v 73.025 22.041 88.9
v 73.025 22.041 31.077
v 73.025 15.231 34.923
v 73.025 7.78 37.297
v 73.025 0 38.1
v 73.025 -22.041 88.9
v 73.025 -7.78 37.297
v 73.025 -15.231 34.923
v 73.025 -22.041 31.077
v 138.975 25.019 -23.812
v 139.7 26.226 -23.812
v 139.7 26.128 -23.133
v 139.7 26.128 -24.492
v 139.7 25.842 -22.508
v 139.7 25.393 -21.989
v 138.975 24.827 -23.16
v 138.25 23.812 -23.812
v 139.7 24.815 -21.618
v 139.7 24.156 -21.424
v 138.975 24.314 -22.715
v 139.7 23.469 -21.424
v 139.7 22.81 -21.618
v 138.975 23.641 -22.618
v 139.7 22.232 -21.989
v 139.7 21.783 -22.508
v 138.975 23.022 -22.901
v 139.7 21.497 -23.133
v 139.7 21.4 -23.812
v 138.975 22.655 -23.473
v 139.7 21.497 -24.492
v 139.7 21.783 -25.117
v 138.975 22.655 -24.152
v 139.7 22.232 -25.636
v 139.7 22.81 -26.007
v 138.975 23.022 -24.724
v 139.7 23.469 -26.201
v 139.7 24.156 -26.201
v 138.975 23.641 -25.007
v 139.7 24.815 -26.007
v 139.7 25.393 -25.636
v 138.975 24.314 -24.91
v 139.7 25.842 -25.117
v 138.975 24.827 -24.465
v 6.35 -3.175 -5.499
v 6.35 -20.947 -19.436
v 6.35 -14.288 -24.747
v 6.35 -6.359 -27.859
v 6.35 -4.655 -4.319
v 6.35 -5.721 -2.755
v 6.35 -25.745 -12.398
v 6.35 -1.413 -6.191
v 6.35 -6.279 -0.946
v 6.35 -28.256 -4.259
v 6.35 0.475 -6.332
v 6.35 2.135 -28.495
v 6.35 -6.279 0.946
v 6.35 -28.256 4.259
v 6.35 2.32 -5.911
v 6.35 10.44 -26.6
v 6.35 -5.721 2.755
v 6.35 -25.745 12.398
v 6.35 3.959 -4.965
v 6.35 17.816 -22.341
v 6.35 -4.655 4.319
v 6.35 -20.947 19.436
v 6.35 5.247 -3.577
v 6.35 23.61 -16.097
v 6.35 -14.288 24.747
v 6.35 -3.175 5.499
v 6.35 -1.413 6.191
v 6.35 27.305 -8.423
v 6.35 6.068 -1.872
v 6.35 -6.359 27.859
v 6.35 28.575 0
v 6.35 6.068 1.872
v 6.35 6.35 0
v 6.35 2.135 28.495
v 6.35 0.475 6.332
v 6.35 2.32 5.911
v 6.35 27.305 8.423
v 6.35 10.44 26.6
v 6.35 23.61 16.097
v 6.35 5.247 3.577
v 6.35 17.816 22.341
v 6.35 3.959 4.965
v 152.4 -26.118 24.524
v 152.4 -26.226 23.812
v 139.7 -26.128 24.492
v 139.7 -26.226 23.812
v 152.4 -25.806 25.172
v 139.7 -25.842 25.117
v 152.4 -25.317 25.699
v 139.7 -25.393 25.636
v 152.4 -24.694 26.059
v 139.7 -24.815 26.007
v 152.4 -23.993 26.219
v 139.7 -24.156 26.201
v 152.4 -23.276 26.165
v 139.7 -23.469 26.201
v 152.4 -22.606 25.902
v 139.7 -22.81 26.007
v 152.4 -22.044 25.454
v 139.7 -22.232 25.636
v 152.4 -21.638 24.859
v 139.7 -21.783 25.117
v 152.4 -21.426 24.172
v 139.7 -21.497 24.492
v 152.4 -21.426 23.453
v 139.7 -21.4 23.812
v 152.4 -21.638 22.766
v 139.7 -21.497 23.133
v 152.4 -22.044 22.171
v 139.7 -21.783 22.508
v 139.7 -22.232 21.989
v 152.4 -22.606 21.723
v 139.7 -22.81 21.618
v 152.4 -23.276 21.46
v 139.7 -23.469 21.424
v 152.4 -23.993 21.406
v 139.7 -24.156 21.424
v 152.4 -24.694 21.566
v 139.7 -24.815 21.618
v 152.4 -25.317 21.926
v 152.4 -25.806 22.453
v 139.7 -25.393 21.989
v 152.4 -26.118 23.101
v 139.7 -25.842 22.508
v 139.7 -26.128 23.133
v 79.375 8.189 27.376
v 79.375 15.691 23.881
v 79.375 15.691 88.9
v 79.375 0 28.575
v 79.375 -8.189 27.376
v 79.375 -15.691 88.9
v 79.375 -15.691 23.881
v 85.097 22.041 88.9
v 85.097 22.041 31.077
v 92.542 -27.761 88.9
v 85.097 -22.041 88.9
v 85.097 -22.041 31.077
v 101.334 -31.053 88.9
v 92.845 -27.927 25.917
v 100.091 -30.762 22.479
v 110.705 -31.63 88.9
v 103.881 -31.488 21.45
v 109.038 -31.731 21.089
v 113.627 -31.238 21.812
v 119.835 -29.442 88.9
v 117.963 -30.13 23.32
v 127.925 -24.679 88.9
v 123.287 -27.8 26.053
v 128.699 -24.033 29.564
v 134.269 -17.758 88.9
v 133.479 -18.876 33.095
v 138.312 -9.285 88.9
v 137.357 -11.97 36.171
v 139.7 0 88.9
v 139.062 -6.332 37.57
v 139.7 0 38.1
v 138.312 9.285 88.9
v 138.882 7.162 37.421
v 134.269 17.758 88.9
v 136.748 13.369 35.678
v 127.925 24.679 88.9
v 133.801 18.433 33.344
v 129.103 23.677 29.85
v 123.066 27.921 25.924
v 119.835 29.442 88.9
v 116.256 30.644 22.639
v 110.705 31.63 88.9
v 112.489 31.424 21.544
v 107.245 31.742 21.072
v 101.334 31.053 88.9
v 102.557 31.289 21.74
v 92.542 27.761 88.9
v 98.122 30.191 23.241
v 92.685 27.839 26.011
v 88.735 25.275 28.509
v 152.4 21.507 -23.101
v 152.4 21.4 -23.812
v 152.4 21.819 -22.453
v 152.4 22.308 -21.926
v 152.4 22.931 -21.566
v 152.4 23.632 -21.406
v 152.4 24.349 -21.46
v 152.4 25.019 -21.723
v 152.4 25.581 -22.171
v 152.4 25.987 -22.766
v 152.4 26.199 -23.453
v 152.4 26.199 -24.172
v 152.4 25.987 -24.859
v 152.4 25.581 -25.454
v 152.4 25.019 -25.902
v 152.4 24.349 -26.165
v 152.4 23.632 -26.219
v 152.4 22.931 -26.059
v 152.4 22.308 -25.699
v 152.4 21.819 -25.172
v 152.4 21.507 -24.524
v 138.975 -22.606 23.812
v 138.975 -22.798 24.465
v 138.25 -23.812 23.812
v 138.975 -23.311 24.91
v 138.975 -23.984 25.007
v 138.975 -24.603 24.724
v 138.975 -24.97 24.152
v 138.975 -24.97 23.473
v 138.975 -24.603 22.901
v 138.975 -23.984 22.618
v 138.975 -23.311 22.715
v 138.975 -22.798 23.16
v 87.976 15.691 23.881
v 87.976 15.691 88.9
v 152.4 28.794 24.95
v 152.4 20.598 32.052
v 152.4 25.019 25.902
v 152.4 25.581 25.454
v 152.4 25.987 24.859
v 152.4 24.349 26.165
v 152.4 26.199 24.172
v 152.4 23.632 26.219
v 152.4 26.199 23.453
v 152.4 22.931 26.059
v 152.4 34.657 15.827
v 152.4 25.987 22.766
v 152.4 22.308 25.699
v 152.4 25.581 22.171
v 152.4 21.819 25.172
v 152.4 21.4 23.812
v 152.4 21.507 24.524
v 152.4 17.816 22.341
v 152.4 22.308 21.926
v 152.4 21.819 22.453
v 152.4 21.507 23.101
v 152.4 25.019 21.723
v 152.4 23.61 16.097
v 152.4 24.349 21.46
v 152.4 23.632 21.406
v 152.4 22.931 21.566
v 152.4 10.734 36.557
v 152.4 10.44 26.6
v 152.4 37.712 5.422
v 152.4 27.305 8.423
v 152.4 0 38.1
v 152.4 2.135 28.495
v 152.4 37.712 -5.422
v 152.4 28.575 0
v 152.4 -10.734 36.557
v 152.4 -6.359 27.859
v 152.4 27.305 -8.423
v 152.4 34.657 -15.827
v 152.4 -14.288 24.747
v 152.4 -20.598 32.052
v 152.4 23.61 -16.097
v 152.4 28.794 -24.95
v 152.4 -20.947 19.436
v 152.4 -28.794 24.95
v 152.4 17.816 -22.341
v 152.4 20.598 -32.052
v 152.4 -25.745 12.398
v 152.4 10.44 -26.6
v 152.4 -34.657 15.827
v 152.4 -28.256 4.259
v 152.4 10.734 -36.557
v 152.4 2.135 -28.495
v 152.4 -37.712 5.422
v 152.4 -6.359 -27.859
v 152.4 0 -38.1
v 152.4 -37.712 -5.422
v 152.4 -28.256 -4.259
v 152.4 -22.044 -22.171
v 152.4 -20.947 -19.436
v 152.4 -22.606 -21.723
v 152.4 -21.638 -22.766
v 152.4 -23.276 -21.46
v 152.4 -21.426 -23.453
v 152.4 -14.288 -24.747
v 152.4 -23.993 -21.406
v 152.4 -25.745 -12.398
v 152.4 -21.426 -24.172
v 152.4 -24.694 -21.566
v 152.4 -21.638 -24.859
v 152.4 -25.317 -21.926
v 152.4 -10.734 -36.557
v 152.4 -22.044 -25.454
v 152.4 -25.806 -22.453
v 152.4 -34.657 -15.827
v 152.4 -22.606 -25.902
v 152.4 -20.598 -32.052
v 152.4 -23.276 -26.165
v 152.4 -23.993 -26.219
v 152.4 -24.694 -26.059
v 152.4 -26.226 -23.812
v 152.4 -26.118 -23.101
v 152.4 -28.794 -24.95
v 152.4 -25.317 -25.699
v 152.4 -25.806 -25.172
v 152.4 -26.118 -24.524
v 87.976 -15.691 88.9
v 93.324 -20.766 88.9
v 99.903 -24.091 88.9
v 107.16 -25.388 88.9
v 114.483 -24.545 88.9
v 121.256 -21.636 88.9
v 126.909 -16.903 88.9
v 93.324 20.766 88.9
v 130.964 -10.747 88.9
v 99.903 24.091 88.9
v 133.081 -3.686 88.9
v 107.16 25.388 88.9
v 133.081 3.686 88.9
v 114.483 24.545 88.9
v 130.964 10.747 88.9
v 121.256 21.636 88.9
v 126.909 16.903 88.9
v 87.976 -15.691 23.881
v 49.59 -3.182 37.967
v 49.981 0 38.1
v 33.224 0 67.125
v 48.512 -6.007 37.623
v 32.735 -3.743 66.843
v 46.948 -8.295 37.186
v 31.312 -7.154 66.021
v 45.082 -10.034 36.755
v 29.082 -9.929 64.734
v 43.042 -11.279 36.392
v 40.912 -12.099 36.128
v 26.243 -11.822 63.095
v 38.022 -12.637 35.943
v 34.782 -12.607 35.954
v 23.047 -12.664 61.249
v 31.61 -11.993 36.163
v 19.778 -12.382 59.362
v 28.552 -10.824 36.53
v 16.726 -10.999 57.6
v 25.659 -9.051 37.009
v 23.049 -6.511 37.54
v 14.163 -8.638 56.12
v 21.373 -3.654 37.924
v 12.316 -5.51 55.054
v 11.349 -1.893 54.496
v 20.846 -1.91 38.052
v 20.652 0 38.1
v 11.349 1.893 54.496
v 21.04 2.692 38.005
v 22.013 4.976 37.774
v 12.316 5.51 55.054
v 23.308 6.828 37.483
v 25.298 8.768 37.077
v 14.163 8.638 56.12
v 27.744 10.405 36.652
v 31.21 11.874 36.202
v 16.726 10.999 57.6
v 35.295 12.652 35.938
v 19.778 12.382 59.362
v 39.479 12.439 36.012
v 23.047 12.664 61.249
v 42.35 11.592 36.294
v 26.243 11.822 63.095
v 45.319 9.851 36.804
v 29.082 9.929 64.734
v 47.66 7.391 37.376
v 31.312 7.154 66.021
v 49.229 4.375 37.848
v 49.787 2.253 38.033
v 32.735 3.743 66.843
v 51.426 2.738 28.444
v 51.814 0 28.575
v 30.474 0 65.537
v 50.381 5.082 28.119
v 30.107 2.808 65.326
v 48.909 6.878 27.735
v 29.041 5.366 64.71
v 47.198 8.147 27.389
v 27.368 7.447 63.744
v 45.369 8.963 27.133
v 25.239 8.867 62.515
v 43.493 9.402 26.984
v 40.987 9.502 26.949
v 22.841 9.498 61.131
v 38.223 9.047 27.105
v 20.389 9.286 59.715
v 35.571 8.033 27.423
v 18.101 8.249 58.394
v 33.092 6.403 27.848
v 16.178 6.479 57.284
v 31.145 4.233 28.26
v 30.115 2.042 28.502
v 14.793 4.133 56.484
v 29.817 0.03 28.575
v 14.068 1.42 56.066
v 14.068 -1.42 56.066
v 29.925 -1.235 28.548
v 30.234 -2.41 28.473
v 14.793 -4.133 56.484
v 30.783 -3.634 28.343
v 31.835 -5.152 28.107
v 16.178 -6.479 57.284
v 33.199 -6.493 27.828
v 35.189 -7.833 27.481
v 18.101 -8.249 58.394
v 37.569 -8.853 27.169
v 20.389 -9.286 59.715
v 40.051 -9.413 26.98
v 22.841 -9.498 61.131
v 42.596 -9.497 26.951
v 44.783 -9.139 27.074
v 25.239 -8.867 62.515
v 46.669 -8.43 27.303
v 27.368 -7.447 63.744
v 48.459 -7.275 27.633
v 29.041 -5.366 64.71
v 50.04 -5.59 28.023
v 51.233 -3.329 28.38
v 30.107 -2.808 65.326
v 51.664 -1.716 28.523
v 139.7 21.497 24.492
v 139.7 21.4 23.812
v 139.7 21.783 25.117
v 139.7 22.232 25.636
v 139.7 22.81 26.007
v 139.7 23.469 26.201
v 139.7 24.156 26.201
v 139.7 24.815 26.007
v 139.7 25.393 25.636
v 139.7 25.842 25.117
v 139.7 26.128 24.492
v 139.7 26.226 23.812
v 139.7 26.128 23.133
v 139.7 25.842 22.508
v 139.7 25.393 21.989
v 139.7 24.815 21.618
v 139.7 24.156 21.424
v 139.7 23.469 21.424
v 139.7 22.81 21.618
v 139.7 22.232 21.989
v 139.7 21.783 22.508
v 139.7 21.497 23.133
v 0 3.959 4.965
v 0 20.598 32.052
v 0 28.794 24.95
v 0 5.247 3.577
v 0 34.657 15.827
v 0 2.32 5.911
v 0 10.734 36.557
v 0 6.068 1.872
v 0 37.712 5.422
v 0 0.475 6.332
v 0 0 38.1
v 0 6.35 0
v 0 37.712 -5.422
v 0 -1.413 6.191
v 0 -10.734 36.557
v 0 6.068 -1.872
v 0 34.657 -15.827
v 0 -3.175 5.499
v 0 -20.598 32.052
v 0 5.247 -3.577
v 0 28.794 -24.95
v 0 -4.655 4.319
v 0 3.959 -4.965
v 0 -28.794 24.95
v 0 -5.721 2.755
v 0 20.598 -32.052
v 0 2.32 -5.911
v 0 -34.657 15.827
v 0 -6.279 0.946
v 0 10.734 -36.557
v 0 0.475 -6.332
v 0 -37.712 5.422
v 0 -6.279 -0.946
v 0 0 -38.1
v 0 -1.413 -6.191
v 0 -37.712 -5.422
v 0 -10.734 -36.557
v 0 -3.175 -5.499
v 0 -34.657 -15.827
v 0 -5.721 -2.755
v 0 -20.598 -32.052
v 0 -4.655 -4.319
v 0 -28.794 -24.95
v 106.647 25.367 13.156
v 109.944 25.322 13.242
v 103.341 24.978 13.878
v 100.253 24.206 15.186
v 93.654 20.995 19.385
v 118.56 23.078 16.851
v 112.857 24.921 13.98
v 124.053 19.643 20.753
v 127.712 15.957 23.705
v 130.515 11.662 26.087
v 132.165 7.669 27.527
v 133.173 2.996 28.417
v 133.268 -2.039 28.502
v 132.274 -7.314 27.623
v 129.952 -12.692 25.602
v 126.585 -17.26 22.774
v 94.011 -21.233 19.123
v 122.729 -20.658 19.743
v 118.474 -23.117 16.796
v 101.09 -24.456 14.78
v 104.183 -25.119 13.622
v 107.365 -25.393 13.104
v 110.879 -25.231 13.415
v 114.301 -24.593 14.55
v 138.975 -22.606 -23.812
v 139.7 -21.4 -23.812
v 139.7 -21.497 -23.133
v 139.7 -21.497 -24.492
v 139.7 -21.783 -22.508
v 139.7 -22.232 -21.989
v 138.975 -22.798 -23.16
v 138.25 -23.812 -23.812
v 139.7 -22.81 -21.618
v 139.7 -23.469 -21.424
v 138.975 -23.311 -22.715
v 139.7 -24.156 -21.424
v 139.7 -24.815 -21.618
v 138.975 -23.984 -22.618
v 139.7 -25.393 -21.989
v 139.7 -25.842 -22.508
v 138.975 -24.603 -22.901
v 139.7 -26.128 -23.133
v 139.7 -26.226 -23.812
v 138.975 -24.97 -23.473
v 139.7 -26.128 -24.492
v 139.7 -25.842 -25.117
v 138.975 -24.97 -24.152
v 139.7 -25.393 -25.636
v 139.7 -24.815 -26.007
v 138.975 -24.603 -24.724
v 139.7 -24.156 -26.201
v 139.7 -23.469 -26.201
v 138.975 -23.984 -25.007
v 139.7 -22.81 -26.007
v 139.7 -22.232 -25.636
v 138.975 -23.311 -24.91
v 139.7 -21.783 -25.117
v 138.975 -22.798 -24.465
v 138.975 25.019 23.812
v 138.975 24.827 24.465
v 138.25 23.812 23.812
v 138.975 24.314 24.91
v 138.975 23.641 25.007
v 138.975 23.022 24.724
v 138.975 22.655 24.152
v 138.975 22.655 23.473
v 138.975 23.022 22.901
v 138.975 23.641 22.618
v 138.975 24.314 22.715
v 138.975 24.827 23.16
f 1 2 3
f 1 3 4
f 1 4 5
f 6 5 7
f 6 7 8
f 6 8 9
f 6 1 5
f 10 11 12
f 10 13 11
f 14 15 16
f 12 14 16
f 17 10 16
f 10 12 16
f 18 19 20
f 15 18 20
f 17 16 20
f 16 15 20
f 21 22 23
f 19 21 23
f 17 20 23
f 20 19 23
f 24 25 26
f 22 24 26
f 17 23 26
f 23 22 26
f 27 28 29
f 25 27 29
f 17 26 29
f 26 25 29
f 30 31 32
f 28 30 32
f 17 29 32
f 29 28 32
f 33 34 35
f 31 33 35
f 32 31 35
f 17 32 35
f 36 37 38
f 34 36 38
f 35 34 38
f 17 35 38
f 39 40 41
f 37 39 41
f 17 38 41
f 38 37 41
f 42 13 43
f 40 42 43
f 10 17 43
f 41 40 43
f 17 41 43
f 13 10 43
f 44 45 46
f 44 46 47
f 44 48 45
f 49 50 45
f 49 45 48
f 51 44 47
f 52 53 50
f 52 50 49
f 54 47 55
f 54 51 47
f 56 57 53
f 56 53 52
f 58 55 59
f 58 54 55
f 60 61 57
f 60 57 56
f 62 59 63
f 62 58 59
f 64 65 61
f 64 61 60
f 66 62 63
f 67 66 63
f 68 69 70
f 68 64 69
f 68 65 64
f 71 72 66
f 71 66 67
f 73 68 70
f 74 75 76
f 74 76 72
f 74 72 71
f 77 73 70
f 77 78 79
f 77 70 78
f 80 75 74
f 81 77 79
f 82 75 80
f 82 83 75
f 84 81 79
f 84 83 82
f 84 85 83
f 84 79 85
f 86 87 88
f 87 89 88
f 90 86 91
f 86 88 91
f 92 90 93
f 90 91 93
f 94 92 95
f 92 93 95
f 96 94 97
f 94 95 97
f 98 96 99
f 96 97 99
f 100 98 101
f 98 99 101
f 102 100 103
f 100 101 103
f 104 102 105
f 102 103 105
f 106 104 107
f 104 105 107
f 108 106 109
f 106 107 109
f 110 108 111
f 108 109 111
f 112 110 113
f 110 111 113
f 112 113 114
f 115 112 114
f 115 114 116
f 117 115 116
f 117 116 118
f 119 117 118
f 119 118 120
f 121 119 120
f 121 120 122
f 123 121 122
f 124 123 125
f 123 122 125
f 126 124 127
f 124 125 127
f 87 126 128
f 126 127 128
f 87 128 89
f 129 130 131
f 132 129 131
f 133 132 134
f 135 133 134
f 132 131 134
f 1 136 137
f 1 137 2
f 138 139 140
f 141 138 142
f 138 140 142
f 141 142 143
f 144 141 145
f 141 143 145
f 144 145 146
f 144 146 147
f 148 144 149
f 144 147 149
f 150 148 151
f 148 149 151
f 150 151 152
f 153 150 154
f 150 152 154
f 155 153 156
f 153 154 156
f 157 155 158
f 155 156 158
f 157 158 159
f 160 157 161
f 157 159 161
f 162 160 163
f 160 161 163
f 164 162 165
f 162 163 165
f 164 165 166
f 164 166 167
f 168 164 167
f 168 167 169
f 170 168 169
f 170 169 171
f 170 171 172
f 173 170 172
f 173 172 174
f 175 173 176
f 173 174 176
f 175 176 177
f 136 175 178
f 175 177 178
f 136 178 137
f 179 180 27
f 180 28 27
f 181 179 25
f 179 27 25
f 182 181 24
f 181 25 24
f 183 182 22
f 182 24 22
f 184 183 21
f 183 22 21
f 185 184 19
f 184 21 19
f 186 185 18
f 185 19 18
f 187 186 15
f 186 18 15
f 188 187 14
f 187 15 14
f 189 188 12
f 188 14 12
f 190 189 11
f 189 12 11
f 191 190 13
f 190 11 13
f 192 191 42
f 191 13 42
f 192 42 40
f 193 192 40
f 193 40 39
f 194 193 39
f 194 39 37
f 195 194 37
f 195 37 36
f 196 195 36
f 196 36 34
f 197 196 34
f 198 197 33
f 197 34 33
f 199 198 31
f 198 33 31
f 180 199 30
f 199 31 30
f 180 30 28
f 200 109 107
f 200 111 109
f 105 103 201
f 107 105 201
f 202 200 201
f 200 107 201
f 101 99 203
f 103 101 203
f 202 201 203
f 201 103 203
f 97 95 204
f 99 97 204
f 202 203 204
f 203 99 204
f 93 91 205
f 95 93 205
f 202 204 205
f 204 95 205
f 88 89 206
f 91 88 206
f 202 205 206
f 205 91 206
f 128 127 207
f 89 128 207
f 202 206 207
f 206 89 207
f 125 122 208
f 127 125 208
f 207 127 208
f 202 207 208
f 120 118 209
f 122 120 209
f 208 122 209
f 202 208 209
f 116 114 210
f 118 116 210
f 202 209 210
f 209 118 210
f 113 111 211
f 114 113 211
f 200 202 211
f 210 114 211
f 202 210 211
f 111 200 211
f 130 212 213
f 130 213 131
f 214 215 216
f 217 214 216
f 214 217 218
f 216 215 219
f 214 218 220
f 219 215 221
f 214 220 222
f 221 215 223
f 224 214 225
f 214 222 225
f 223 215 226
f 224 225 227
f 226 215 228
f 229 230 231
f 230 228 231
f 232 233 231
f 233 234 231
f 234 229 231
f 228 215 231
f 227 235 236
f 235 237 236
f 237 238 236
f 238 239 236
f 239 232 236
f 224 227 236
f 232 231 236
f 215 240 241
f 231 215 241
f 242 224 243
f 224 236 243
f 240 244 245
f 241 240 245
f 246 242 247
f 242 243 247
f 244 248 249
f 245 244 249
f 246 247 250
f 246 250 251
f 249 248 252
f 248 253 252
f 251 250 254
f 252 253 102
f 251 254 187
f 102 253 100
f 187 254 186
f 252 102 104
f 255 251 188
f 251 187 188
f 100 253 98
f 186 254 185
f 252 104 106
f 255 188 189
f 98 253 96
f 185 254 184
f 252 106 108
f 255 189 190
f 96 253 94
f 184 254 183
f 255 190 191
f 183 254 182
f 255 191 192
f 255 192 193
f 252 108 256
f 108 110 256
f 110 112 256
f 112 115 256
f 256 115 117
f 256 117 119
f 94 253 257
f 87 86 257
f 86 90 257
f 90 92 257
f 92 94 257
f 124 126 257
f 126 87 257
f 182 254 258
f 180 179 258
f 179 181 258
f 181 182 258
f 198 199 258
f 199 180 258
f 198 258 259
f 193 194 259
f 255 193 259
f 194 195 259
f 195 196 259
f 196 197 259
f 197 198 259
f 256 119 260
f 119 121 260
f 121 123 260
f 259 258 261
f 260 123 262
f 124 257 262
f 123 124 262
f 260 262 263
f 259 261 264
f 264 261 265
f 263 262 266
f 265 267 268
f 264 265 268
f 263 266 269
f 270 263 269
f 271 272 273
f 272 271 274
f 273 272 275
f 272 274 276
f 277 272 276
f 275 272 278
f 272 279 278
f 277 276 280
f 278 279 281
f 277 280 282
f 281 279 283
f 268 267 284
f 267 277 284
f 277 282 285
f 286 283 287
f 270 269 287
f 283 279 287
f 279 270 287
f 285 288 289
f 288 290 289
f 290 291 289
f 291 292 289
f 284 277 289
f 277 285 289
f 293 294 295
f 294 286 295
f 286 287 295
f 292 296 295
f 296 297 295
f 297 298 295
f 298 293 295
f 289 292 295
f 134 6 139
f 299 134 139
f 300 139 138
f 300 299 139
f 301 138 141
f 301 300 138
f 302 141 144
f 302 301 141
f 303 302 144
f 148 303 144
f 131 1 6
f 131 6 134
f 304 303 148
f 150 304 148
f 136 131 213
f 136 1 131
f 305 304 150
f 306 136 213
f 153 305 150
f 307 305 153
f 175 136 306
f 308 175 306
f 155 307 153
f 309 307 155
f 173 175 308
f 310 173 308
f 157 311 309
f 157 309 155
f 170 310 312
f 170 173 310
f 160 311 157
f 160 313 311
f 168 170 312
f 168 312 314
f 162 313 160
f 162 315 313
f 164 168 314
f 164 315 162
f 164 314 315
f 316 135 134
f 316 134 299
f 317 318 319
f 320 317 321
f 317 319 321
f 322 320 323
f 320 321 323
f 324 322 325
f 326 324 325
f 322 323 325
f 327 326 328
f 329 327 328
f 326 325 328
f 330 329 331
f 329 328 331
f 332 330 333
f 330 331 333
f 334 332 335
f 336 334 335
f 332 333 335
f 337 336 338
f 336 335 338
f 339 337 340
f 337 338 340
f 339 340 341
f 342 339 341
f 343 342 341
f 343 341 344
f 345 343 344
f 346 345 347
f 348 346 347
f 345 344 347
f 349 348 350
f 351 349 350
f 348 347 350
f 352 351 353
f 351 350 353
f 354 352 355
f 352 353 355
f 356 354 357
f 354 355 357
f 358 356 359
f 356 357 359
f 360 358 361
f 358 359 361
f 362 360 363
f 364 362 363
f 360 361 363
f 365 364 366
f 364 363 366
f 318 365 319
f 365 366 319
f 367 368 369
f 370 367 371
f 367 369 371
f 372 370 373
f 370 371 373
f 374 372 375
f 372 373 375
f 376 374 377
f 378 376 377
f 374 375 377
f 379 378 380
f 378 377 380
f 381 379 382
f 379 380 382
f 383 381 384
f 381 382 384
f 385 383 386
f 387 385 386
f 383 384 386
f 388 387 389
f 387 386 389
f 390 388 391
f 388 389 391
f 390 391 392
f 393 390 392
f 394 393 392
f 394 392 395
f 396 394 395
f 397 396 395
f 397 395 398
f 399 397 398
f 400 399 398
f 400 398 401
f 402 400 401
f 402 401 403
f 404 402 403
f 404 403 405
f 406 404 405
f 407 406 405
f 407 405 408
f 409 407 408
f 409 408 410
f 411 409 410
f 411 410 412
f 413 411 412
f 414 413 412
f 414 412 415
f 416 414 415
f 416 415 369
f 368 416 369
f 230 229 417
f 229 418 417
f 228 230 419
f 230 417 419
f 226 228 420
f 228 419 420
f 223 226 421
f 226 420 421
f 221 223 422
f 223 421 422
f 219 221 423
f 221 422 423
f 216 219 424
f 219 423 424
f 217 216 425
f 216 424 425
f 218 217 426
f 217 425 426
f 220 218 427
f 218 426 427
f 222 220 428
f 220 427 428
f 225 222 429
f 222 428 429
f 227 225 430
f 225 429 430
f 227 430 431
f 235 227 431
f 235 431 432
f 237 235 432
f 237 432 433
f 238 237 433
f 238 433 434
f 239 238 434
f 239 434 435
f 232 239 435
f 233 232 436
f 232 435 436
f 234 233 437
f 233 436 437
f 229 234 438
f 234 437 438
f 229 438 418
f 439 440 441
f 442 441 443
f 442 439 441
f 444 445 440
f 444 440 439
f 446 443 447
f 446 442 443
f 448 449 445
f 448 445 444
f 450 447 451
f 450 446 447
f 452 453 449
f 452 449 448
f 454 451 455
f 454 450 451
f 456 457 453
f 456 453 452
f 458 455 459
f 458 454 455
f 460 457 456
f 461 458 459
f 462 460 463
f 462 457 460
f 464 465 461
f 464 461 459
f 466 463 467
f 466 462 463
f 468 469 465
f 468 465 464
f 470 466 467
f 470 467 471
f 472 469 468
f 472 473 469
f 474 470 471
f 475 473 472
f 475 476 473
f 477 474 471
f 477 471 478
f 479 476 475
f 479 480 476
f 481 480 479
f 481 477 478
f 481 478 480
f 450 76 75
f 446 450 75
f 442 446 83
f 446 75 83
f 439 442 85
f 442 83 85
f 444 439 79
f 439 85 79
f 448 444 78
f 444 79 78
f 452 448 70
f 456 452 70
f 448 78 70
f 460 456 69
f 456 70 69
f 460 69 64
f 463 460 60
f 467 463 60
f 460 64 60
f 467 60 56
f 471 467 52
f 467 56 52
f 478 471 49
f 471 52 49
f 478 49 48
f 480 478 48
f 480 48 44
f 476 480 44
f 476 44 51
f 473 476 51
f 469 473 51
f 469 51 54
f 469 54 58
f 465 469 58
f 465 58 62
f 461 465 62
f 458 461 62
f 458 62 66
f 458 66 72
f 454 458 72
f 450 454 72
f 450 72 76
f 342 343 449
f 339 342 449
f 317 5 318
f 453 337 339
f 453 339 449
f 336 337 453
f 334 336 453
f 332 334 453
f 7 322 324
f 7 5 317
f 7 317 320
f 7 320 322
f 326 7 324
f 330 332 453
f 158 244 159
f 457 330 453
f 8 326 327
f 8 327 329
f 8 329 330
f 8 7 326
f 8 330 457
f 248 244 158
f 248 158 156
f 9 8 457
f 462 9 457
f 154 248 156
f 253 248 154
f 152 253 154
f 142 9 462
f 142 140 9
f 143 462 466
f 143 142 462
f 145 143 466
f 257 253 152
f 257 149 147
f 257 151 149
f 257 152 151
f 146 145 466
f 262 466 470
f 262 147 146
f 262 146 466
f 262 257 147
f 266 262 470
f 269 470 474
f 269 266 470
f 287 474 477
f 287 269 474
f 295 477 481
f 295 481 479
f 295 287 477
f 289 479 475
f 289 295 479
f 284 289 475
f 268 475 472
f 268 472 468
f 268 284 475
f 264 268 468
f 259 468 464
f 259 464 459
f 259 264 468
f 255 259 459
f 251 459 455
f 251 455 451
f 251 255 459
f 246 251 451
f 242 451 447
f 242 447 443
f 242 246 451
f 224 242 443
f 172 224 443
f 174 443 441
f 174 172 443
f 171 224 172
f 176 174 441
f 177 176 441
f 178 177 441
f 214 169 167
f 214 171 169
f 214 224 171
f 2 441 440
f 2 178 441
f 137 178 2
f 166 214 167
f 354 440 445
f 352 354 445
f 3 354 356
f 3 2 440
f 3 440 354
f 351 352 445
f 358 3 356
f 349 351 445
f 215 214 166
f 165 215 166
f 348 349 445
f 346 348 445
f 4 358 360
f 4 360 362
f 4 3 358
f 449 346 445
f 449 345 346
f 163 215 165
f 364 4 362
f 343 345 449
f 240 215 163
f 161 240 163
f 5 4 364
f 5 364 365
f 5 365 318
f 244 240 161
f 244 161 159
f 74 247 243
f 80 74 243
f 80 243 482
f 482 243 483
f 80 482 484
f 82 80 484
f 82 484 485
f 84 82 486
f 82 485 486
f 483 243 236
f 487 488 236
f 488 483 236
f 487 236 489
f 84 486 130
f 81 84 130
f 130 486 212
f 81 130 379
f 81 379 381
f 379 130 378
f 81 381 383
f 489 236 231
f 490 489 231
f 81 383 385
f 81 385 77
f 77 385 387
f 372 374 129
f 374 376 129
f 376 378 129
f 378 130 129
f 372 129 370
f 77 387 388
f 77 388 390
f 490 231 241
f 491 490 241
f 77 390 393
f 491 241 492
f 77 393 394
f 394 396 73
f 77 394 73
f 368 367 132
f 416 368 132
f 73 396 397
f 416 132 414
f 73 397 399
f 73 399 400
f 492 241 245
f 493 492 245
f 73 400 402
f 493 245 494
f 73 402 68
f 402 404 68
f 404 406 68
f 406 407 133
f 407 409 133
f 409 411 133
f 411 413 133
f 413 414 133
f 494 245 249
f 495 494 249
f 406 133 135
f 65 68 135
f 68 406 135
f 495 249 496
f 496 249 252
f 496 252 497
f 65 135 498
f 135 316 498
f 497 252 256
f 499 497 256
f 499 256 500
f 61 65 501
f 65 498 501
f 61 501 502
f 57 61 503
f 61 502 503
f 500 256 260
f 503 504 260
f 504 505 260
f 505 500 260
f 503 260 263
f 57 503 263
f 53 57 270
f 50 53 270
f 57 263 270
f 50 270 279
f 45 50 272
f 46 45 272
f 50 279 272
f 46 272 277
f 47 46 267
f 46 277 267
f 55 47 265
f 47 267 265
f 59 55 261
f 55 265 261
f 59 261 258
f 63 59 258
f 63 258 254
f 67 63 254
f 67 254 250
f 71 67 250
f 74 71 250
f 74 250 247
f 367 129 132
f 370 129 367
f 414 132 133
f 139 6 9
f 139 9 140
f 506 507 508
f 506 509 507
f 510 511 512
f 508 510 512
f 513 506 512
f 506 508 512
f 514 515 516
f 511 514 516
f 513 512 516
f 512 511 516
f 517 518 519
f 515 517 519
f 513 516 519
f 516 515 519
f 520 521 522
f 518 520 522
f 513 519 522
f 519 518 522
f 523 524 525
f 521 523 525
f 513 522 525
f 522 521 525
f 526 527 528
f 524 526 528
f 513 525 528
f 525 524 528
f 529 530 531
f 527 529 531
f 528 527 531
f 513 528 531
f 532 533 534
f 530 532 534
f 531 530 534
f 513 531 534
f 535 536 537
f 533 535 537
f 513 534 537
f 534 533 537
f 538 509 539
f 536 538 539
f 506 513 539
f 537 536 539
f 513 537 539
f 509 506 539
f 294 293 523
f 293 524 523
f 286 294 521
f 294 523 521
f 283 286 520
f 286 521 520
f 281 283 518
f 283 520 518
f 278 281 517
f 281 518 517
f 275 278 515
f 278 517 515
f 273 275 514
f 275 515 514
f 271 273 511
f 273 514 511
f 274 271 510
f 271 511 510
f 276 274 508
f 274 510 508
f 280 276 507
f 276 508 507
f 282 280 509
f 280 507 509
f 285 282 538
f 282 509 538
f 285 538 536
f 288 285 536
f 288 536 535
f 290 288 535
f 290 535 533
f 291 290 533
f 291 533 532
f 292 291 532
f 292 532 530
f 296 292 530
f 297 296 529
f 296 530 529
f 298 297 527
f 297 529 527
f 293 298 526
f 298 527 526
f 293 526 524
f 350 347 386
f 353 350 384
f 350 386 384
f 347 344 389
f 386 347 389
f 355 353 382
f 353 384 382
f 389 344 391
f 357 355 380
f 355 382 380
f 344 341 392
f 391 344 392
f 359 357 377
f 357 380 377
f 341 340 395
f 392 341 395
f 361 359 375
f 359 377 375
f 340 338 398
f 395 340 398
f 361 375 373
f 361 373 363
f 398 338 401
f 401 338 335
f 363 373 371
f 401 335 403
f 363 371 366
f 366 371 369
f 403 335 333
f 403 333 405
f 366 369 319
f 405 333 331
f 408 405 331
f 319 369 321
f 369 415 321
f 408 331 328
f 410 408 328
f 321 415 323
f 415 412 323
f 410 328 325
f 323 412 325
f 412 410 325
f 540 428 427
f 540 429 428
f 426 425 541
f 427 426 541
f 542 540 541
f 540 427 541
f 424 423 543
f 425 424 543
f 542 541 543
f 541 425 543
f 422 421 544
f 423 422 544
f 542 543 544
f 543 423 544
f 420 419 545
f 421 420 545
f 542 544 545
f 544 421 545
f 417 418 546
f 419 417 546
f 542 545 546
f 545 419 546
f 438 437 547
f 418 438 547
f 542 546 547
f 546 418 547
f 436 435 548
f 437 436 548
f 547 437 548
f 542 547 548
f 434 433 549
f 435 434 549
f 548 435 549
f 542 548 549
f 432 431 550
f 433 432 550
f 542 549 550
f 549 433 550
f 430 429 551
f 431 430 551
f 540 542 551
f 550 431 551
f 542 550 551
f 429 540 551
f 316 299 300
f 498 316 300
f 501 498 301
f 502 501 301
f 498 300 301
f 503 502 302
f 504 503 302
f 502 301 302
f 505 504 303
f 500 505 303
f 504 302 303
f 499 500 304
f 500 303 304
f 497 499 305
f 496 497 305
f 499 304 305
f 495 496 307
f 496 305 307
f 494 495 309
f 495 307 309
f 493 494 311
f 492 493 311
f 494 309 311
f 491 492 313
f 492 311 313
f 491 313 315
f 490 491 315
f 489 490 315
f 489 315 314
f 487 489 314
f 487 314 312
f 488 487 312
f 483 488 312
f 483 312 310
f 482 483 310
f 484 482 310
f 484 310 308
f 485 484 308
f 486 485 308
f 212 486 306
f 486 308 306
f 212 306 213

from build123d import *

# Parameters (mm, degrees)
F0_W      = 152.4
F0_H      = 38.1
F3_R      = 31.75
F4_DEPTH  = 25.4
F5_DEPTH  = 50.8
F7_DEPTH  = 76.2
F11_DEPTH = 76.2
F12_R     = 28.575
F13_DEPTH = 146.05
F14_R     = 9.525
F15_DEPTH = 50.8
F17_D     = 4.826
F17_DEPTH = 12.7
F17_TIP   = 1.4498766737
F19_D     = 12.7
F19_DEPTH = 12.7
F19_TIP   = 3.8154649308


# Not quite as in the source:
# - a feature names something its author has since deleted; it is built from what else it names


with BuildPart() as f1:
    # F0 (on Front) → F1 (revolve)
    with BuildSketch(Plane.XZ):
        with Locations((76.2, 19.05)):
            Rectangle(F0_W, F0_H)
    revolve(axis=Axis((76.2, 0, 0), (1, 0, 0)))

    # F3 (on offset) → F4 (join)
    with BuildSketch(Plane.XY.offset(38.1)):
        with Locations((107.95, 0)):
            Circle(F3_R)
    extrude(amount=-F4_DEPTH)

    # F5 (add): a face of the model
    f5_faces = [f1.faces().sort_by_distance(p)[0] for p in [
        (107.95, 0, 38.1),
    ]]
    extrude(f5_faces, amount=F5_DEPTH)

    # F6 (on face) → F7 (join)
    with BuildSketch(Plane.XY.offset(88.9)):
        with BuildLine():
            Line((73.025, -22.0412760045), (85.097327244, -22.0412760045))
            ThreePointArc((85.097327244, -22.0412760045), (76.2, 0), (85.097327244, 22.0412760045))
            Line((85.097327244, 22.0412760045), (73.025, 22.0412760045))
            Line((73.025, 22.0412760045), (73.025, -22.0412760045))
        make_face()
    extrude(amount=-F7_DEPTH)

    # F8 (on Front) → F9 (revolve)
    with BuildSketch(Plane.XZ):
        Polygon((33.2235226281, 67.1248349075), (22.225, 60.7748349075), (38.982496247, 31.75), (49.9810188751, 38.1), align=None)
    revolve(axis=Axis((30.6037481235, 0, 46.2624174538), (0.5, 0, -0.8660254038)))

    # F10 (on face) → F11 (cut)
    with BuildSketch(Plane.XY.offset(88.9)):
        with BuildLine():
            Line((79.3750002146, -15.69127579), (87.9764211223, -15.69127579))
            ThreePointArc((87.9764211223, -15.69127579), (133.3499997854, 0), (87.9764211223, 15.69127579))
            Line((87.9764211223, 15.69127579), (79.3750002146, 15.69127579))
            Line((79.3750002146, 15.69127579), (79.3750002146, -15.69127579))
        make_face()
    extrude(amount=-F11_DEPTH, mode=Mode.SUBTRACT)

    # F12 (on face) → F13 (cut)
    with BuildSketch(Plane.YZ.offset(152.4)):
        Circle(F12_R)
    extrude(amount=-F13_DEPTH, mode=Mode.SUBTRACT)

    # F14 (on face) → F15 (cut)
    with BuildSketch(Plane(origin=(-20.7600254704, 0, 35.9574188811), x_dir=(0.8660254038, 0, 0.5), z_dir=(-0.5, 0, 0.8660254038))):
        with Locations((49.6348320529, 0)):
            Circle(F14_R)
    extrude(amount=-F15_DEPTH, mode=Mode.SUBTRACT)

    # F17
    with Locations(Plane.YZ.offset(152.4)):
        with Locations((-23.8125, 23.8125), (23.8125, 23.8125), (23.8125, -23.8125), (-23.8125, -23.8125)):
            Hole(F17_D / 2, depth=F17_DEPTH)
            with Locations((0, 0, -(F17_DEPTH + F17_TIP / 2))):  # 118° drill point
                Cone(0, F17_D / 2, F17_TIP, mode=Mode.SUBTRACT)

    # F19
    with Locations(Plane(origin=(0, 0, 0), x_dir=(0, -1, 0), z_dir=(-1, 0, 0))):
        with Locations((0, 0)):
            Hole(F19_D / 2, depth=F19_DEPTH)
            with Locations((0, 0, -(F19_DEPTH + F19_TIP / 2))):  # 118° drill point
                Cone(0, F19_D / 2, F19_TIP, mode=Mode.SUBTRACT)


solid = f1.part
